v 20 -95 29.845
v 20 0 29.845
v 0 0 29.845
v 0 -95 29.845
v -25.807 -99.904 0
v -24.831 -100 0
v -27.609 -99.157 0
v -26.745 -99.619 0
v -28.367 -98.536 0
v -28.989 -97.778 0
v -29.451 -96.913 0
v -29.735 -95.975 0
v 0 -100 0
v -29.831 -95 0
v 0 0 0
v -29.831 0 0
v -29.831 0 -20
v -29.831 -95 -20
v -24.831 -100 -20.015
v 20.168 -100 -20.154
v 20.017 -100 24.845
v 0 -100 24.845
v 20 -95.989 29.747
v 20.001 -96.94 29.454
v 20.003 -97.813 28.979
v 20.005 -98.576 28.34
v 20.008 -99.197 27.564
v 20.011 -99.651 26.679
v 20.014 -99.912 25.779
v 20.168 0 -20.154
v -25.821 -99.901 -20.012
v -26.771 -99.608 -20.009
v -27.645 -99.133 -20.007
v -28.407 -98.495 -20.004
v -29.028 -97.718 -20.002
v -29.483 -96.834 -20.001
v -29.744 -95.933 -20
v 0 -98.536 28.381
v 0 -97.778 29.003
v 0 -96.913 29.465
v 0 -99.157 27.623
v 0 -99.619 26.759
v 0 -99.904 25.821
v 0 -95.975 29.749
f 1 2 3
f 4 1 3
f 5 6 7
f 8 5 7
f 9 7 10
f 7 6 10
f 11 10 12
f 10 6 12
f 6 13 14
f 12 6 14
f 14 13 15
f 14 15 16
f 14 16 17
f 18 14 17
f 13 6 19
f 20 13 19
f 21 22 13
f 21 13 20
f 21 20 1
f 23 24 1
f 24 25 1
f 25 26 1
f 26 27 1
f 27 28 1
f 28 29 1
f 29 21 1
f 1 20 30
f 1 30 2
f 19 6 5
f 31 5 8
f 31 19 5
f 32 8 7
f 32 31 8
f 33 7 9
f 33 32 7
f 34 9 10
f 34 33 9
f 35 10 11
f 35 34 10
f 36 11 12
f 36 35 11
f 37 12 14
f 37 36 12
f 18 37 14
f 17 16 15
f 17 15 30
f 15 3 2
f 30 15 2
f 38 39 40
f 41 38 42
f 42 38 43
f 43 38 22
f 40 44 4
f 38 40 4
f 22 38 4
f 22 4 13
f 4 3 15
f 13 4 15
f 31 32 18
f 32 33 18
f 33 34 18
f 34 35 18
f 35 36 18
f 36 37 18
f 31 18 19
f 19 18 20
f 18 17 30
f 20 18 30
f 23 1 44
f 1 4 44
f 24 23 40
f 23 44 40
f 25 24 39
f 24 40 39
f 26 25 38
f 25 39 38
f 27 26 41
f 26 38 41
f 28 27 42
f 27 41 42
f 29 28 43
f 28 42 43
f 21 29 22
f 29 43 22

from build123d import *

# Parameters (mm, degrees)
F1_DEPTH = 100
F2_R     = 5
F3_R     = 5


with BuildPart() as f1:
    # F0 (on Front) → F1 (new body)
    with BuildSketch(Plane.XZ):
        Polygon((0, 29.845397), (0, 0), (-29.831411, 0), (-29.831411, -20), (20.16835, -20.15432), (20, 29.845397), align=None)
    extrude(amount=F1_DEPTH)

    # F2
    f2_edges = [f1.edges().sort_by_distance(p)[0] for p in [
        (10, -100, 29.845397),
    ]]
    fillet(f2_edges, radius=F2_R)

    # F3
    f3_edges = [f1.edges().sort_by_distance(p)[0] for p in [
        (-29.831411, -100, -10),
    ]]
    fillet(f3_edges, radius=F3_R)


solid = f1.part
